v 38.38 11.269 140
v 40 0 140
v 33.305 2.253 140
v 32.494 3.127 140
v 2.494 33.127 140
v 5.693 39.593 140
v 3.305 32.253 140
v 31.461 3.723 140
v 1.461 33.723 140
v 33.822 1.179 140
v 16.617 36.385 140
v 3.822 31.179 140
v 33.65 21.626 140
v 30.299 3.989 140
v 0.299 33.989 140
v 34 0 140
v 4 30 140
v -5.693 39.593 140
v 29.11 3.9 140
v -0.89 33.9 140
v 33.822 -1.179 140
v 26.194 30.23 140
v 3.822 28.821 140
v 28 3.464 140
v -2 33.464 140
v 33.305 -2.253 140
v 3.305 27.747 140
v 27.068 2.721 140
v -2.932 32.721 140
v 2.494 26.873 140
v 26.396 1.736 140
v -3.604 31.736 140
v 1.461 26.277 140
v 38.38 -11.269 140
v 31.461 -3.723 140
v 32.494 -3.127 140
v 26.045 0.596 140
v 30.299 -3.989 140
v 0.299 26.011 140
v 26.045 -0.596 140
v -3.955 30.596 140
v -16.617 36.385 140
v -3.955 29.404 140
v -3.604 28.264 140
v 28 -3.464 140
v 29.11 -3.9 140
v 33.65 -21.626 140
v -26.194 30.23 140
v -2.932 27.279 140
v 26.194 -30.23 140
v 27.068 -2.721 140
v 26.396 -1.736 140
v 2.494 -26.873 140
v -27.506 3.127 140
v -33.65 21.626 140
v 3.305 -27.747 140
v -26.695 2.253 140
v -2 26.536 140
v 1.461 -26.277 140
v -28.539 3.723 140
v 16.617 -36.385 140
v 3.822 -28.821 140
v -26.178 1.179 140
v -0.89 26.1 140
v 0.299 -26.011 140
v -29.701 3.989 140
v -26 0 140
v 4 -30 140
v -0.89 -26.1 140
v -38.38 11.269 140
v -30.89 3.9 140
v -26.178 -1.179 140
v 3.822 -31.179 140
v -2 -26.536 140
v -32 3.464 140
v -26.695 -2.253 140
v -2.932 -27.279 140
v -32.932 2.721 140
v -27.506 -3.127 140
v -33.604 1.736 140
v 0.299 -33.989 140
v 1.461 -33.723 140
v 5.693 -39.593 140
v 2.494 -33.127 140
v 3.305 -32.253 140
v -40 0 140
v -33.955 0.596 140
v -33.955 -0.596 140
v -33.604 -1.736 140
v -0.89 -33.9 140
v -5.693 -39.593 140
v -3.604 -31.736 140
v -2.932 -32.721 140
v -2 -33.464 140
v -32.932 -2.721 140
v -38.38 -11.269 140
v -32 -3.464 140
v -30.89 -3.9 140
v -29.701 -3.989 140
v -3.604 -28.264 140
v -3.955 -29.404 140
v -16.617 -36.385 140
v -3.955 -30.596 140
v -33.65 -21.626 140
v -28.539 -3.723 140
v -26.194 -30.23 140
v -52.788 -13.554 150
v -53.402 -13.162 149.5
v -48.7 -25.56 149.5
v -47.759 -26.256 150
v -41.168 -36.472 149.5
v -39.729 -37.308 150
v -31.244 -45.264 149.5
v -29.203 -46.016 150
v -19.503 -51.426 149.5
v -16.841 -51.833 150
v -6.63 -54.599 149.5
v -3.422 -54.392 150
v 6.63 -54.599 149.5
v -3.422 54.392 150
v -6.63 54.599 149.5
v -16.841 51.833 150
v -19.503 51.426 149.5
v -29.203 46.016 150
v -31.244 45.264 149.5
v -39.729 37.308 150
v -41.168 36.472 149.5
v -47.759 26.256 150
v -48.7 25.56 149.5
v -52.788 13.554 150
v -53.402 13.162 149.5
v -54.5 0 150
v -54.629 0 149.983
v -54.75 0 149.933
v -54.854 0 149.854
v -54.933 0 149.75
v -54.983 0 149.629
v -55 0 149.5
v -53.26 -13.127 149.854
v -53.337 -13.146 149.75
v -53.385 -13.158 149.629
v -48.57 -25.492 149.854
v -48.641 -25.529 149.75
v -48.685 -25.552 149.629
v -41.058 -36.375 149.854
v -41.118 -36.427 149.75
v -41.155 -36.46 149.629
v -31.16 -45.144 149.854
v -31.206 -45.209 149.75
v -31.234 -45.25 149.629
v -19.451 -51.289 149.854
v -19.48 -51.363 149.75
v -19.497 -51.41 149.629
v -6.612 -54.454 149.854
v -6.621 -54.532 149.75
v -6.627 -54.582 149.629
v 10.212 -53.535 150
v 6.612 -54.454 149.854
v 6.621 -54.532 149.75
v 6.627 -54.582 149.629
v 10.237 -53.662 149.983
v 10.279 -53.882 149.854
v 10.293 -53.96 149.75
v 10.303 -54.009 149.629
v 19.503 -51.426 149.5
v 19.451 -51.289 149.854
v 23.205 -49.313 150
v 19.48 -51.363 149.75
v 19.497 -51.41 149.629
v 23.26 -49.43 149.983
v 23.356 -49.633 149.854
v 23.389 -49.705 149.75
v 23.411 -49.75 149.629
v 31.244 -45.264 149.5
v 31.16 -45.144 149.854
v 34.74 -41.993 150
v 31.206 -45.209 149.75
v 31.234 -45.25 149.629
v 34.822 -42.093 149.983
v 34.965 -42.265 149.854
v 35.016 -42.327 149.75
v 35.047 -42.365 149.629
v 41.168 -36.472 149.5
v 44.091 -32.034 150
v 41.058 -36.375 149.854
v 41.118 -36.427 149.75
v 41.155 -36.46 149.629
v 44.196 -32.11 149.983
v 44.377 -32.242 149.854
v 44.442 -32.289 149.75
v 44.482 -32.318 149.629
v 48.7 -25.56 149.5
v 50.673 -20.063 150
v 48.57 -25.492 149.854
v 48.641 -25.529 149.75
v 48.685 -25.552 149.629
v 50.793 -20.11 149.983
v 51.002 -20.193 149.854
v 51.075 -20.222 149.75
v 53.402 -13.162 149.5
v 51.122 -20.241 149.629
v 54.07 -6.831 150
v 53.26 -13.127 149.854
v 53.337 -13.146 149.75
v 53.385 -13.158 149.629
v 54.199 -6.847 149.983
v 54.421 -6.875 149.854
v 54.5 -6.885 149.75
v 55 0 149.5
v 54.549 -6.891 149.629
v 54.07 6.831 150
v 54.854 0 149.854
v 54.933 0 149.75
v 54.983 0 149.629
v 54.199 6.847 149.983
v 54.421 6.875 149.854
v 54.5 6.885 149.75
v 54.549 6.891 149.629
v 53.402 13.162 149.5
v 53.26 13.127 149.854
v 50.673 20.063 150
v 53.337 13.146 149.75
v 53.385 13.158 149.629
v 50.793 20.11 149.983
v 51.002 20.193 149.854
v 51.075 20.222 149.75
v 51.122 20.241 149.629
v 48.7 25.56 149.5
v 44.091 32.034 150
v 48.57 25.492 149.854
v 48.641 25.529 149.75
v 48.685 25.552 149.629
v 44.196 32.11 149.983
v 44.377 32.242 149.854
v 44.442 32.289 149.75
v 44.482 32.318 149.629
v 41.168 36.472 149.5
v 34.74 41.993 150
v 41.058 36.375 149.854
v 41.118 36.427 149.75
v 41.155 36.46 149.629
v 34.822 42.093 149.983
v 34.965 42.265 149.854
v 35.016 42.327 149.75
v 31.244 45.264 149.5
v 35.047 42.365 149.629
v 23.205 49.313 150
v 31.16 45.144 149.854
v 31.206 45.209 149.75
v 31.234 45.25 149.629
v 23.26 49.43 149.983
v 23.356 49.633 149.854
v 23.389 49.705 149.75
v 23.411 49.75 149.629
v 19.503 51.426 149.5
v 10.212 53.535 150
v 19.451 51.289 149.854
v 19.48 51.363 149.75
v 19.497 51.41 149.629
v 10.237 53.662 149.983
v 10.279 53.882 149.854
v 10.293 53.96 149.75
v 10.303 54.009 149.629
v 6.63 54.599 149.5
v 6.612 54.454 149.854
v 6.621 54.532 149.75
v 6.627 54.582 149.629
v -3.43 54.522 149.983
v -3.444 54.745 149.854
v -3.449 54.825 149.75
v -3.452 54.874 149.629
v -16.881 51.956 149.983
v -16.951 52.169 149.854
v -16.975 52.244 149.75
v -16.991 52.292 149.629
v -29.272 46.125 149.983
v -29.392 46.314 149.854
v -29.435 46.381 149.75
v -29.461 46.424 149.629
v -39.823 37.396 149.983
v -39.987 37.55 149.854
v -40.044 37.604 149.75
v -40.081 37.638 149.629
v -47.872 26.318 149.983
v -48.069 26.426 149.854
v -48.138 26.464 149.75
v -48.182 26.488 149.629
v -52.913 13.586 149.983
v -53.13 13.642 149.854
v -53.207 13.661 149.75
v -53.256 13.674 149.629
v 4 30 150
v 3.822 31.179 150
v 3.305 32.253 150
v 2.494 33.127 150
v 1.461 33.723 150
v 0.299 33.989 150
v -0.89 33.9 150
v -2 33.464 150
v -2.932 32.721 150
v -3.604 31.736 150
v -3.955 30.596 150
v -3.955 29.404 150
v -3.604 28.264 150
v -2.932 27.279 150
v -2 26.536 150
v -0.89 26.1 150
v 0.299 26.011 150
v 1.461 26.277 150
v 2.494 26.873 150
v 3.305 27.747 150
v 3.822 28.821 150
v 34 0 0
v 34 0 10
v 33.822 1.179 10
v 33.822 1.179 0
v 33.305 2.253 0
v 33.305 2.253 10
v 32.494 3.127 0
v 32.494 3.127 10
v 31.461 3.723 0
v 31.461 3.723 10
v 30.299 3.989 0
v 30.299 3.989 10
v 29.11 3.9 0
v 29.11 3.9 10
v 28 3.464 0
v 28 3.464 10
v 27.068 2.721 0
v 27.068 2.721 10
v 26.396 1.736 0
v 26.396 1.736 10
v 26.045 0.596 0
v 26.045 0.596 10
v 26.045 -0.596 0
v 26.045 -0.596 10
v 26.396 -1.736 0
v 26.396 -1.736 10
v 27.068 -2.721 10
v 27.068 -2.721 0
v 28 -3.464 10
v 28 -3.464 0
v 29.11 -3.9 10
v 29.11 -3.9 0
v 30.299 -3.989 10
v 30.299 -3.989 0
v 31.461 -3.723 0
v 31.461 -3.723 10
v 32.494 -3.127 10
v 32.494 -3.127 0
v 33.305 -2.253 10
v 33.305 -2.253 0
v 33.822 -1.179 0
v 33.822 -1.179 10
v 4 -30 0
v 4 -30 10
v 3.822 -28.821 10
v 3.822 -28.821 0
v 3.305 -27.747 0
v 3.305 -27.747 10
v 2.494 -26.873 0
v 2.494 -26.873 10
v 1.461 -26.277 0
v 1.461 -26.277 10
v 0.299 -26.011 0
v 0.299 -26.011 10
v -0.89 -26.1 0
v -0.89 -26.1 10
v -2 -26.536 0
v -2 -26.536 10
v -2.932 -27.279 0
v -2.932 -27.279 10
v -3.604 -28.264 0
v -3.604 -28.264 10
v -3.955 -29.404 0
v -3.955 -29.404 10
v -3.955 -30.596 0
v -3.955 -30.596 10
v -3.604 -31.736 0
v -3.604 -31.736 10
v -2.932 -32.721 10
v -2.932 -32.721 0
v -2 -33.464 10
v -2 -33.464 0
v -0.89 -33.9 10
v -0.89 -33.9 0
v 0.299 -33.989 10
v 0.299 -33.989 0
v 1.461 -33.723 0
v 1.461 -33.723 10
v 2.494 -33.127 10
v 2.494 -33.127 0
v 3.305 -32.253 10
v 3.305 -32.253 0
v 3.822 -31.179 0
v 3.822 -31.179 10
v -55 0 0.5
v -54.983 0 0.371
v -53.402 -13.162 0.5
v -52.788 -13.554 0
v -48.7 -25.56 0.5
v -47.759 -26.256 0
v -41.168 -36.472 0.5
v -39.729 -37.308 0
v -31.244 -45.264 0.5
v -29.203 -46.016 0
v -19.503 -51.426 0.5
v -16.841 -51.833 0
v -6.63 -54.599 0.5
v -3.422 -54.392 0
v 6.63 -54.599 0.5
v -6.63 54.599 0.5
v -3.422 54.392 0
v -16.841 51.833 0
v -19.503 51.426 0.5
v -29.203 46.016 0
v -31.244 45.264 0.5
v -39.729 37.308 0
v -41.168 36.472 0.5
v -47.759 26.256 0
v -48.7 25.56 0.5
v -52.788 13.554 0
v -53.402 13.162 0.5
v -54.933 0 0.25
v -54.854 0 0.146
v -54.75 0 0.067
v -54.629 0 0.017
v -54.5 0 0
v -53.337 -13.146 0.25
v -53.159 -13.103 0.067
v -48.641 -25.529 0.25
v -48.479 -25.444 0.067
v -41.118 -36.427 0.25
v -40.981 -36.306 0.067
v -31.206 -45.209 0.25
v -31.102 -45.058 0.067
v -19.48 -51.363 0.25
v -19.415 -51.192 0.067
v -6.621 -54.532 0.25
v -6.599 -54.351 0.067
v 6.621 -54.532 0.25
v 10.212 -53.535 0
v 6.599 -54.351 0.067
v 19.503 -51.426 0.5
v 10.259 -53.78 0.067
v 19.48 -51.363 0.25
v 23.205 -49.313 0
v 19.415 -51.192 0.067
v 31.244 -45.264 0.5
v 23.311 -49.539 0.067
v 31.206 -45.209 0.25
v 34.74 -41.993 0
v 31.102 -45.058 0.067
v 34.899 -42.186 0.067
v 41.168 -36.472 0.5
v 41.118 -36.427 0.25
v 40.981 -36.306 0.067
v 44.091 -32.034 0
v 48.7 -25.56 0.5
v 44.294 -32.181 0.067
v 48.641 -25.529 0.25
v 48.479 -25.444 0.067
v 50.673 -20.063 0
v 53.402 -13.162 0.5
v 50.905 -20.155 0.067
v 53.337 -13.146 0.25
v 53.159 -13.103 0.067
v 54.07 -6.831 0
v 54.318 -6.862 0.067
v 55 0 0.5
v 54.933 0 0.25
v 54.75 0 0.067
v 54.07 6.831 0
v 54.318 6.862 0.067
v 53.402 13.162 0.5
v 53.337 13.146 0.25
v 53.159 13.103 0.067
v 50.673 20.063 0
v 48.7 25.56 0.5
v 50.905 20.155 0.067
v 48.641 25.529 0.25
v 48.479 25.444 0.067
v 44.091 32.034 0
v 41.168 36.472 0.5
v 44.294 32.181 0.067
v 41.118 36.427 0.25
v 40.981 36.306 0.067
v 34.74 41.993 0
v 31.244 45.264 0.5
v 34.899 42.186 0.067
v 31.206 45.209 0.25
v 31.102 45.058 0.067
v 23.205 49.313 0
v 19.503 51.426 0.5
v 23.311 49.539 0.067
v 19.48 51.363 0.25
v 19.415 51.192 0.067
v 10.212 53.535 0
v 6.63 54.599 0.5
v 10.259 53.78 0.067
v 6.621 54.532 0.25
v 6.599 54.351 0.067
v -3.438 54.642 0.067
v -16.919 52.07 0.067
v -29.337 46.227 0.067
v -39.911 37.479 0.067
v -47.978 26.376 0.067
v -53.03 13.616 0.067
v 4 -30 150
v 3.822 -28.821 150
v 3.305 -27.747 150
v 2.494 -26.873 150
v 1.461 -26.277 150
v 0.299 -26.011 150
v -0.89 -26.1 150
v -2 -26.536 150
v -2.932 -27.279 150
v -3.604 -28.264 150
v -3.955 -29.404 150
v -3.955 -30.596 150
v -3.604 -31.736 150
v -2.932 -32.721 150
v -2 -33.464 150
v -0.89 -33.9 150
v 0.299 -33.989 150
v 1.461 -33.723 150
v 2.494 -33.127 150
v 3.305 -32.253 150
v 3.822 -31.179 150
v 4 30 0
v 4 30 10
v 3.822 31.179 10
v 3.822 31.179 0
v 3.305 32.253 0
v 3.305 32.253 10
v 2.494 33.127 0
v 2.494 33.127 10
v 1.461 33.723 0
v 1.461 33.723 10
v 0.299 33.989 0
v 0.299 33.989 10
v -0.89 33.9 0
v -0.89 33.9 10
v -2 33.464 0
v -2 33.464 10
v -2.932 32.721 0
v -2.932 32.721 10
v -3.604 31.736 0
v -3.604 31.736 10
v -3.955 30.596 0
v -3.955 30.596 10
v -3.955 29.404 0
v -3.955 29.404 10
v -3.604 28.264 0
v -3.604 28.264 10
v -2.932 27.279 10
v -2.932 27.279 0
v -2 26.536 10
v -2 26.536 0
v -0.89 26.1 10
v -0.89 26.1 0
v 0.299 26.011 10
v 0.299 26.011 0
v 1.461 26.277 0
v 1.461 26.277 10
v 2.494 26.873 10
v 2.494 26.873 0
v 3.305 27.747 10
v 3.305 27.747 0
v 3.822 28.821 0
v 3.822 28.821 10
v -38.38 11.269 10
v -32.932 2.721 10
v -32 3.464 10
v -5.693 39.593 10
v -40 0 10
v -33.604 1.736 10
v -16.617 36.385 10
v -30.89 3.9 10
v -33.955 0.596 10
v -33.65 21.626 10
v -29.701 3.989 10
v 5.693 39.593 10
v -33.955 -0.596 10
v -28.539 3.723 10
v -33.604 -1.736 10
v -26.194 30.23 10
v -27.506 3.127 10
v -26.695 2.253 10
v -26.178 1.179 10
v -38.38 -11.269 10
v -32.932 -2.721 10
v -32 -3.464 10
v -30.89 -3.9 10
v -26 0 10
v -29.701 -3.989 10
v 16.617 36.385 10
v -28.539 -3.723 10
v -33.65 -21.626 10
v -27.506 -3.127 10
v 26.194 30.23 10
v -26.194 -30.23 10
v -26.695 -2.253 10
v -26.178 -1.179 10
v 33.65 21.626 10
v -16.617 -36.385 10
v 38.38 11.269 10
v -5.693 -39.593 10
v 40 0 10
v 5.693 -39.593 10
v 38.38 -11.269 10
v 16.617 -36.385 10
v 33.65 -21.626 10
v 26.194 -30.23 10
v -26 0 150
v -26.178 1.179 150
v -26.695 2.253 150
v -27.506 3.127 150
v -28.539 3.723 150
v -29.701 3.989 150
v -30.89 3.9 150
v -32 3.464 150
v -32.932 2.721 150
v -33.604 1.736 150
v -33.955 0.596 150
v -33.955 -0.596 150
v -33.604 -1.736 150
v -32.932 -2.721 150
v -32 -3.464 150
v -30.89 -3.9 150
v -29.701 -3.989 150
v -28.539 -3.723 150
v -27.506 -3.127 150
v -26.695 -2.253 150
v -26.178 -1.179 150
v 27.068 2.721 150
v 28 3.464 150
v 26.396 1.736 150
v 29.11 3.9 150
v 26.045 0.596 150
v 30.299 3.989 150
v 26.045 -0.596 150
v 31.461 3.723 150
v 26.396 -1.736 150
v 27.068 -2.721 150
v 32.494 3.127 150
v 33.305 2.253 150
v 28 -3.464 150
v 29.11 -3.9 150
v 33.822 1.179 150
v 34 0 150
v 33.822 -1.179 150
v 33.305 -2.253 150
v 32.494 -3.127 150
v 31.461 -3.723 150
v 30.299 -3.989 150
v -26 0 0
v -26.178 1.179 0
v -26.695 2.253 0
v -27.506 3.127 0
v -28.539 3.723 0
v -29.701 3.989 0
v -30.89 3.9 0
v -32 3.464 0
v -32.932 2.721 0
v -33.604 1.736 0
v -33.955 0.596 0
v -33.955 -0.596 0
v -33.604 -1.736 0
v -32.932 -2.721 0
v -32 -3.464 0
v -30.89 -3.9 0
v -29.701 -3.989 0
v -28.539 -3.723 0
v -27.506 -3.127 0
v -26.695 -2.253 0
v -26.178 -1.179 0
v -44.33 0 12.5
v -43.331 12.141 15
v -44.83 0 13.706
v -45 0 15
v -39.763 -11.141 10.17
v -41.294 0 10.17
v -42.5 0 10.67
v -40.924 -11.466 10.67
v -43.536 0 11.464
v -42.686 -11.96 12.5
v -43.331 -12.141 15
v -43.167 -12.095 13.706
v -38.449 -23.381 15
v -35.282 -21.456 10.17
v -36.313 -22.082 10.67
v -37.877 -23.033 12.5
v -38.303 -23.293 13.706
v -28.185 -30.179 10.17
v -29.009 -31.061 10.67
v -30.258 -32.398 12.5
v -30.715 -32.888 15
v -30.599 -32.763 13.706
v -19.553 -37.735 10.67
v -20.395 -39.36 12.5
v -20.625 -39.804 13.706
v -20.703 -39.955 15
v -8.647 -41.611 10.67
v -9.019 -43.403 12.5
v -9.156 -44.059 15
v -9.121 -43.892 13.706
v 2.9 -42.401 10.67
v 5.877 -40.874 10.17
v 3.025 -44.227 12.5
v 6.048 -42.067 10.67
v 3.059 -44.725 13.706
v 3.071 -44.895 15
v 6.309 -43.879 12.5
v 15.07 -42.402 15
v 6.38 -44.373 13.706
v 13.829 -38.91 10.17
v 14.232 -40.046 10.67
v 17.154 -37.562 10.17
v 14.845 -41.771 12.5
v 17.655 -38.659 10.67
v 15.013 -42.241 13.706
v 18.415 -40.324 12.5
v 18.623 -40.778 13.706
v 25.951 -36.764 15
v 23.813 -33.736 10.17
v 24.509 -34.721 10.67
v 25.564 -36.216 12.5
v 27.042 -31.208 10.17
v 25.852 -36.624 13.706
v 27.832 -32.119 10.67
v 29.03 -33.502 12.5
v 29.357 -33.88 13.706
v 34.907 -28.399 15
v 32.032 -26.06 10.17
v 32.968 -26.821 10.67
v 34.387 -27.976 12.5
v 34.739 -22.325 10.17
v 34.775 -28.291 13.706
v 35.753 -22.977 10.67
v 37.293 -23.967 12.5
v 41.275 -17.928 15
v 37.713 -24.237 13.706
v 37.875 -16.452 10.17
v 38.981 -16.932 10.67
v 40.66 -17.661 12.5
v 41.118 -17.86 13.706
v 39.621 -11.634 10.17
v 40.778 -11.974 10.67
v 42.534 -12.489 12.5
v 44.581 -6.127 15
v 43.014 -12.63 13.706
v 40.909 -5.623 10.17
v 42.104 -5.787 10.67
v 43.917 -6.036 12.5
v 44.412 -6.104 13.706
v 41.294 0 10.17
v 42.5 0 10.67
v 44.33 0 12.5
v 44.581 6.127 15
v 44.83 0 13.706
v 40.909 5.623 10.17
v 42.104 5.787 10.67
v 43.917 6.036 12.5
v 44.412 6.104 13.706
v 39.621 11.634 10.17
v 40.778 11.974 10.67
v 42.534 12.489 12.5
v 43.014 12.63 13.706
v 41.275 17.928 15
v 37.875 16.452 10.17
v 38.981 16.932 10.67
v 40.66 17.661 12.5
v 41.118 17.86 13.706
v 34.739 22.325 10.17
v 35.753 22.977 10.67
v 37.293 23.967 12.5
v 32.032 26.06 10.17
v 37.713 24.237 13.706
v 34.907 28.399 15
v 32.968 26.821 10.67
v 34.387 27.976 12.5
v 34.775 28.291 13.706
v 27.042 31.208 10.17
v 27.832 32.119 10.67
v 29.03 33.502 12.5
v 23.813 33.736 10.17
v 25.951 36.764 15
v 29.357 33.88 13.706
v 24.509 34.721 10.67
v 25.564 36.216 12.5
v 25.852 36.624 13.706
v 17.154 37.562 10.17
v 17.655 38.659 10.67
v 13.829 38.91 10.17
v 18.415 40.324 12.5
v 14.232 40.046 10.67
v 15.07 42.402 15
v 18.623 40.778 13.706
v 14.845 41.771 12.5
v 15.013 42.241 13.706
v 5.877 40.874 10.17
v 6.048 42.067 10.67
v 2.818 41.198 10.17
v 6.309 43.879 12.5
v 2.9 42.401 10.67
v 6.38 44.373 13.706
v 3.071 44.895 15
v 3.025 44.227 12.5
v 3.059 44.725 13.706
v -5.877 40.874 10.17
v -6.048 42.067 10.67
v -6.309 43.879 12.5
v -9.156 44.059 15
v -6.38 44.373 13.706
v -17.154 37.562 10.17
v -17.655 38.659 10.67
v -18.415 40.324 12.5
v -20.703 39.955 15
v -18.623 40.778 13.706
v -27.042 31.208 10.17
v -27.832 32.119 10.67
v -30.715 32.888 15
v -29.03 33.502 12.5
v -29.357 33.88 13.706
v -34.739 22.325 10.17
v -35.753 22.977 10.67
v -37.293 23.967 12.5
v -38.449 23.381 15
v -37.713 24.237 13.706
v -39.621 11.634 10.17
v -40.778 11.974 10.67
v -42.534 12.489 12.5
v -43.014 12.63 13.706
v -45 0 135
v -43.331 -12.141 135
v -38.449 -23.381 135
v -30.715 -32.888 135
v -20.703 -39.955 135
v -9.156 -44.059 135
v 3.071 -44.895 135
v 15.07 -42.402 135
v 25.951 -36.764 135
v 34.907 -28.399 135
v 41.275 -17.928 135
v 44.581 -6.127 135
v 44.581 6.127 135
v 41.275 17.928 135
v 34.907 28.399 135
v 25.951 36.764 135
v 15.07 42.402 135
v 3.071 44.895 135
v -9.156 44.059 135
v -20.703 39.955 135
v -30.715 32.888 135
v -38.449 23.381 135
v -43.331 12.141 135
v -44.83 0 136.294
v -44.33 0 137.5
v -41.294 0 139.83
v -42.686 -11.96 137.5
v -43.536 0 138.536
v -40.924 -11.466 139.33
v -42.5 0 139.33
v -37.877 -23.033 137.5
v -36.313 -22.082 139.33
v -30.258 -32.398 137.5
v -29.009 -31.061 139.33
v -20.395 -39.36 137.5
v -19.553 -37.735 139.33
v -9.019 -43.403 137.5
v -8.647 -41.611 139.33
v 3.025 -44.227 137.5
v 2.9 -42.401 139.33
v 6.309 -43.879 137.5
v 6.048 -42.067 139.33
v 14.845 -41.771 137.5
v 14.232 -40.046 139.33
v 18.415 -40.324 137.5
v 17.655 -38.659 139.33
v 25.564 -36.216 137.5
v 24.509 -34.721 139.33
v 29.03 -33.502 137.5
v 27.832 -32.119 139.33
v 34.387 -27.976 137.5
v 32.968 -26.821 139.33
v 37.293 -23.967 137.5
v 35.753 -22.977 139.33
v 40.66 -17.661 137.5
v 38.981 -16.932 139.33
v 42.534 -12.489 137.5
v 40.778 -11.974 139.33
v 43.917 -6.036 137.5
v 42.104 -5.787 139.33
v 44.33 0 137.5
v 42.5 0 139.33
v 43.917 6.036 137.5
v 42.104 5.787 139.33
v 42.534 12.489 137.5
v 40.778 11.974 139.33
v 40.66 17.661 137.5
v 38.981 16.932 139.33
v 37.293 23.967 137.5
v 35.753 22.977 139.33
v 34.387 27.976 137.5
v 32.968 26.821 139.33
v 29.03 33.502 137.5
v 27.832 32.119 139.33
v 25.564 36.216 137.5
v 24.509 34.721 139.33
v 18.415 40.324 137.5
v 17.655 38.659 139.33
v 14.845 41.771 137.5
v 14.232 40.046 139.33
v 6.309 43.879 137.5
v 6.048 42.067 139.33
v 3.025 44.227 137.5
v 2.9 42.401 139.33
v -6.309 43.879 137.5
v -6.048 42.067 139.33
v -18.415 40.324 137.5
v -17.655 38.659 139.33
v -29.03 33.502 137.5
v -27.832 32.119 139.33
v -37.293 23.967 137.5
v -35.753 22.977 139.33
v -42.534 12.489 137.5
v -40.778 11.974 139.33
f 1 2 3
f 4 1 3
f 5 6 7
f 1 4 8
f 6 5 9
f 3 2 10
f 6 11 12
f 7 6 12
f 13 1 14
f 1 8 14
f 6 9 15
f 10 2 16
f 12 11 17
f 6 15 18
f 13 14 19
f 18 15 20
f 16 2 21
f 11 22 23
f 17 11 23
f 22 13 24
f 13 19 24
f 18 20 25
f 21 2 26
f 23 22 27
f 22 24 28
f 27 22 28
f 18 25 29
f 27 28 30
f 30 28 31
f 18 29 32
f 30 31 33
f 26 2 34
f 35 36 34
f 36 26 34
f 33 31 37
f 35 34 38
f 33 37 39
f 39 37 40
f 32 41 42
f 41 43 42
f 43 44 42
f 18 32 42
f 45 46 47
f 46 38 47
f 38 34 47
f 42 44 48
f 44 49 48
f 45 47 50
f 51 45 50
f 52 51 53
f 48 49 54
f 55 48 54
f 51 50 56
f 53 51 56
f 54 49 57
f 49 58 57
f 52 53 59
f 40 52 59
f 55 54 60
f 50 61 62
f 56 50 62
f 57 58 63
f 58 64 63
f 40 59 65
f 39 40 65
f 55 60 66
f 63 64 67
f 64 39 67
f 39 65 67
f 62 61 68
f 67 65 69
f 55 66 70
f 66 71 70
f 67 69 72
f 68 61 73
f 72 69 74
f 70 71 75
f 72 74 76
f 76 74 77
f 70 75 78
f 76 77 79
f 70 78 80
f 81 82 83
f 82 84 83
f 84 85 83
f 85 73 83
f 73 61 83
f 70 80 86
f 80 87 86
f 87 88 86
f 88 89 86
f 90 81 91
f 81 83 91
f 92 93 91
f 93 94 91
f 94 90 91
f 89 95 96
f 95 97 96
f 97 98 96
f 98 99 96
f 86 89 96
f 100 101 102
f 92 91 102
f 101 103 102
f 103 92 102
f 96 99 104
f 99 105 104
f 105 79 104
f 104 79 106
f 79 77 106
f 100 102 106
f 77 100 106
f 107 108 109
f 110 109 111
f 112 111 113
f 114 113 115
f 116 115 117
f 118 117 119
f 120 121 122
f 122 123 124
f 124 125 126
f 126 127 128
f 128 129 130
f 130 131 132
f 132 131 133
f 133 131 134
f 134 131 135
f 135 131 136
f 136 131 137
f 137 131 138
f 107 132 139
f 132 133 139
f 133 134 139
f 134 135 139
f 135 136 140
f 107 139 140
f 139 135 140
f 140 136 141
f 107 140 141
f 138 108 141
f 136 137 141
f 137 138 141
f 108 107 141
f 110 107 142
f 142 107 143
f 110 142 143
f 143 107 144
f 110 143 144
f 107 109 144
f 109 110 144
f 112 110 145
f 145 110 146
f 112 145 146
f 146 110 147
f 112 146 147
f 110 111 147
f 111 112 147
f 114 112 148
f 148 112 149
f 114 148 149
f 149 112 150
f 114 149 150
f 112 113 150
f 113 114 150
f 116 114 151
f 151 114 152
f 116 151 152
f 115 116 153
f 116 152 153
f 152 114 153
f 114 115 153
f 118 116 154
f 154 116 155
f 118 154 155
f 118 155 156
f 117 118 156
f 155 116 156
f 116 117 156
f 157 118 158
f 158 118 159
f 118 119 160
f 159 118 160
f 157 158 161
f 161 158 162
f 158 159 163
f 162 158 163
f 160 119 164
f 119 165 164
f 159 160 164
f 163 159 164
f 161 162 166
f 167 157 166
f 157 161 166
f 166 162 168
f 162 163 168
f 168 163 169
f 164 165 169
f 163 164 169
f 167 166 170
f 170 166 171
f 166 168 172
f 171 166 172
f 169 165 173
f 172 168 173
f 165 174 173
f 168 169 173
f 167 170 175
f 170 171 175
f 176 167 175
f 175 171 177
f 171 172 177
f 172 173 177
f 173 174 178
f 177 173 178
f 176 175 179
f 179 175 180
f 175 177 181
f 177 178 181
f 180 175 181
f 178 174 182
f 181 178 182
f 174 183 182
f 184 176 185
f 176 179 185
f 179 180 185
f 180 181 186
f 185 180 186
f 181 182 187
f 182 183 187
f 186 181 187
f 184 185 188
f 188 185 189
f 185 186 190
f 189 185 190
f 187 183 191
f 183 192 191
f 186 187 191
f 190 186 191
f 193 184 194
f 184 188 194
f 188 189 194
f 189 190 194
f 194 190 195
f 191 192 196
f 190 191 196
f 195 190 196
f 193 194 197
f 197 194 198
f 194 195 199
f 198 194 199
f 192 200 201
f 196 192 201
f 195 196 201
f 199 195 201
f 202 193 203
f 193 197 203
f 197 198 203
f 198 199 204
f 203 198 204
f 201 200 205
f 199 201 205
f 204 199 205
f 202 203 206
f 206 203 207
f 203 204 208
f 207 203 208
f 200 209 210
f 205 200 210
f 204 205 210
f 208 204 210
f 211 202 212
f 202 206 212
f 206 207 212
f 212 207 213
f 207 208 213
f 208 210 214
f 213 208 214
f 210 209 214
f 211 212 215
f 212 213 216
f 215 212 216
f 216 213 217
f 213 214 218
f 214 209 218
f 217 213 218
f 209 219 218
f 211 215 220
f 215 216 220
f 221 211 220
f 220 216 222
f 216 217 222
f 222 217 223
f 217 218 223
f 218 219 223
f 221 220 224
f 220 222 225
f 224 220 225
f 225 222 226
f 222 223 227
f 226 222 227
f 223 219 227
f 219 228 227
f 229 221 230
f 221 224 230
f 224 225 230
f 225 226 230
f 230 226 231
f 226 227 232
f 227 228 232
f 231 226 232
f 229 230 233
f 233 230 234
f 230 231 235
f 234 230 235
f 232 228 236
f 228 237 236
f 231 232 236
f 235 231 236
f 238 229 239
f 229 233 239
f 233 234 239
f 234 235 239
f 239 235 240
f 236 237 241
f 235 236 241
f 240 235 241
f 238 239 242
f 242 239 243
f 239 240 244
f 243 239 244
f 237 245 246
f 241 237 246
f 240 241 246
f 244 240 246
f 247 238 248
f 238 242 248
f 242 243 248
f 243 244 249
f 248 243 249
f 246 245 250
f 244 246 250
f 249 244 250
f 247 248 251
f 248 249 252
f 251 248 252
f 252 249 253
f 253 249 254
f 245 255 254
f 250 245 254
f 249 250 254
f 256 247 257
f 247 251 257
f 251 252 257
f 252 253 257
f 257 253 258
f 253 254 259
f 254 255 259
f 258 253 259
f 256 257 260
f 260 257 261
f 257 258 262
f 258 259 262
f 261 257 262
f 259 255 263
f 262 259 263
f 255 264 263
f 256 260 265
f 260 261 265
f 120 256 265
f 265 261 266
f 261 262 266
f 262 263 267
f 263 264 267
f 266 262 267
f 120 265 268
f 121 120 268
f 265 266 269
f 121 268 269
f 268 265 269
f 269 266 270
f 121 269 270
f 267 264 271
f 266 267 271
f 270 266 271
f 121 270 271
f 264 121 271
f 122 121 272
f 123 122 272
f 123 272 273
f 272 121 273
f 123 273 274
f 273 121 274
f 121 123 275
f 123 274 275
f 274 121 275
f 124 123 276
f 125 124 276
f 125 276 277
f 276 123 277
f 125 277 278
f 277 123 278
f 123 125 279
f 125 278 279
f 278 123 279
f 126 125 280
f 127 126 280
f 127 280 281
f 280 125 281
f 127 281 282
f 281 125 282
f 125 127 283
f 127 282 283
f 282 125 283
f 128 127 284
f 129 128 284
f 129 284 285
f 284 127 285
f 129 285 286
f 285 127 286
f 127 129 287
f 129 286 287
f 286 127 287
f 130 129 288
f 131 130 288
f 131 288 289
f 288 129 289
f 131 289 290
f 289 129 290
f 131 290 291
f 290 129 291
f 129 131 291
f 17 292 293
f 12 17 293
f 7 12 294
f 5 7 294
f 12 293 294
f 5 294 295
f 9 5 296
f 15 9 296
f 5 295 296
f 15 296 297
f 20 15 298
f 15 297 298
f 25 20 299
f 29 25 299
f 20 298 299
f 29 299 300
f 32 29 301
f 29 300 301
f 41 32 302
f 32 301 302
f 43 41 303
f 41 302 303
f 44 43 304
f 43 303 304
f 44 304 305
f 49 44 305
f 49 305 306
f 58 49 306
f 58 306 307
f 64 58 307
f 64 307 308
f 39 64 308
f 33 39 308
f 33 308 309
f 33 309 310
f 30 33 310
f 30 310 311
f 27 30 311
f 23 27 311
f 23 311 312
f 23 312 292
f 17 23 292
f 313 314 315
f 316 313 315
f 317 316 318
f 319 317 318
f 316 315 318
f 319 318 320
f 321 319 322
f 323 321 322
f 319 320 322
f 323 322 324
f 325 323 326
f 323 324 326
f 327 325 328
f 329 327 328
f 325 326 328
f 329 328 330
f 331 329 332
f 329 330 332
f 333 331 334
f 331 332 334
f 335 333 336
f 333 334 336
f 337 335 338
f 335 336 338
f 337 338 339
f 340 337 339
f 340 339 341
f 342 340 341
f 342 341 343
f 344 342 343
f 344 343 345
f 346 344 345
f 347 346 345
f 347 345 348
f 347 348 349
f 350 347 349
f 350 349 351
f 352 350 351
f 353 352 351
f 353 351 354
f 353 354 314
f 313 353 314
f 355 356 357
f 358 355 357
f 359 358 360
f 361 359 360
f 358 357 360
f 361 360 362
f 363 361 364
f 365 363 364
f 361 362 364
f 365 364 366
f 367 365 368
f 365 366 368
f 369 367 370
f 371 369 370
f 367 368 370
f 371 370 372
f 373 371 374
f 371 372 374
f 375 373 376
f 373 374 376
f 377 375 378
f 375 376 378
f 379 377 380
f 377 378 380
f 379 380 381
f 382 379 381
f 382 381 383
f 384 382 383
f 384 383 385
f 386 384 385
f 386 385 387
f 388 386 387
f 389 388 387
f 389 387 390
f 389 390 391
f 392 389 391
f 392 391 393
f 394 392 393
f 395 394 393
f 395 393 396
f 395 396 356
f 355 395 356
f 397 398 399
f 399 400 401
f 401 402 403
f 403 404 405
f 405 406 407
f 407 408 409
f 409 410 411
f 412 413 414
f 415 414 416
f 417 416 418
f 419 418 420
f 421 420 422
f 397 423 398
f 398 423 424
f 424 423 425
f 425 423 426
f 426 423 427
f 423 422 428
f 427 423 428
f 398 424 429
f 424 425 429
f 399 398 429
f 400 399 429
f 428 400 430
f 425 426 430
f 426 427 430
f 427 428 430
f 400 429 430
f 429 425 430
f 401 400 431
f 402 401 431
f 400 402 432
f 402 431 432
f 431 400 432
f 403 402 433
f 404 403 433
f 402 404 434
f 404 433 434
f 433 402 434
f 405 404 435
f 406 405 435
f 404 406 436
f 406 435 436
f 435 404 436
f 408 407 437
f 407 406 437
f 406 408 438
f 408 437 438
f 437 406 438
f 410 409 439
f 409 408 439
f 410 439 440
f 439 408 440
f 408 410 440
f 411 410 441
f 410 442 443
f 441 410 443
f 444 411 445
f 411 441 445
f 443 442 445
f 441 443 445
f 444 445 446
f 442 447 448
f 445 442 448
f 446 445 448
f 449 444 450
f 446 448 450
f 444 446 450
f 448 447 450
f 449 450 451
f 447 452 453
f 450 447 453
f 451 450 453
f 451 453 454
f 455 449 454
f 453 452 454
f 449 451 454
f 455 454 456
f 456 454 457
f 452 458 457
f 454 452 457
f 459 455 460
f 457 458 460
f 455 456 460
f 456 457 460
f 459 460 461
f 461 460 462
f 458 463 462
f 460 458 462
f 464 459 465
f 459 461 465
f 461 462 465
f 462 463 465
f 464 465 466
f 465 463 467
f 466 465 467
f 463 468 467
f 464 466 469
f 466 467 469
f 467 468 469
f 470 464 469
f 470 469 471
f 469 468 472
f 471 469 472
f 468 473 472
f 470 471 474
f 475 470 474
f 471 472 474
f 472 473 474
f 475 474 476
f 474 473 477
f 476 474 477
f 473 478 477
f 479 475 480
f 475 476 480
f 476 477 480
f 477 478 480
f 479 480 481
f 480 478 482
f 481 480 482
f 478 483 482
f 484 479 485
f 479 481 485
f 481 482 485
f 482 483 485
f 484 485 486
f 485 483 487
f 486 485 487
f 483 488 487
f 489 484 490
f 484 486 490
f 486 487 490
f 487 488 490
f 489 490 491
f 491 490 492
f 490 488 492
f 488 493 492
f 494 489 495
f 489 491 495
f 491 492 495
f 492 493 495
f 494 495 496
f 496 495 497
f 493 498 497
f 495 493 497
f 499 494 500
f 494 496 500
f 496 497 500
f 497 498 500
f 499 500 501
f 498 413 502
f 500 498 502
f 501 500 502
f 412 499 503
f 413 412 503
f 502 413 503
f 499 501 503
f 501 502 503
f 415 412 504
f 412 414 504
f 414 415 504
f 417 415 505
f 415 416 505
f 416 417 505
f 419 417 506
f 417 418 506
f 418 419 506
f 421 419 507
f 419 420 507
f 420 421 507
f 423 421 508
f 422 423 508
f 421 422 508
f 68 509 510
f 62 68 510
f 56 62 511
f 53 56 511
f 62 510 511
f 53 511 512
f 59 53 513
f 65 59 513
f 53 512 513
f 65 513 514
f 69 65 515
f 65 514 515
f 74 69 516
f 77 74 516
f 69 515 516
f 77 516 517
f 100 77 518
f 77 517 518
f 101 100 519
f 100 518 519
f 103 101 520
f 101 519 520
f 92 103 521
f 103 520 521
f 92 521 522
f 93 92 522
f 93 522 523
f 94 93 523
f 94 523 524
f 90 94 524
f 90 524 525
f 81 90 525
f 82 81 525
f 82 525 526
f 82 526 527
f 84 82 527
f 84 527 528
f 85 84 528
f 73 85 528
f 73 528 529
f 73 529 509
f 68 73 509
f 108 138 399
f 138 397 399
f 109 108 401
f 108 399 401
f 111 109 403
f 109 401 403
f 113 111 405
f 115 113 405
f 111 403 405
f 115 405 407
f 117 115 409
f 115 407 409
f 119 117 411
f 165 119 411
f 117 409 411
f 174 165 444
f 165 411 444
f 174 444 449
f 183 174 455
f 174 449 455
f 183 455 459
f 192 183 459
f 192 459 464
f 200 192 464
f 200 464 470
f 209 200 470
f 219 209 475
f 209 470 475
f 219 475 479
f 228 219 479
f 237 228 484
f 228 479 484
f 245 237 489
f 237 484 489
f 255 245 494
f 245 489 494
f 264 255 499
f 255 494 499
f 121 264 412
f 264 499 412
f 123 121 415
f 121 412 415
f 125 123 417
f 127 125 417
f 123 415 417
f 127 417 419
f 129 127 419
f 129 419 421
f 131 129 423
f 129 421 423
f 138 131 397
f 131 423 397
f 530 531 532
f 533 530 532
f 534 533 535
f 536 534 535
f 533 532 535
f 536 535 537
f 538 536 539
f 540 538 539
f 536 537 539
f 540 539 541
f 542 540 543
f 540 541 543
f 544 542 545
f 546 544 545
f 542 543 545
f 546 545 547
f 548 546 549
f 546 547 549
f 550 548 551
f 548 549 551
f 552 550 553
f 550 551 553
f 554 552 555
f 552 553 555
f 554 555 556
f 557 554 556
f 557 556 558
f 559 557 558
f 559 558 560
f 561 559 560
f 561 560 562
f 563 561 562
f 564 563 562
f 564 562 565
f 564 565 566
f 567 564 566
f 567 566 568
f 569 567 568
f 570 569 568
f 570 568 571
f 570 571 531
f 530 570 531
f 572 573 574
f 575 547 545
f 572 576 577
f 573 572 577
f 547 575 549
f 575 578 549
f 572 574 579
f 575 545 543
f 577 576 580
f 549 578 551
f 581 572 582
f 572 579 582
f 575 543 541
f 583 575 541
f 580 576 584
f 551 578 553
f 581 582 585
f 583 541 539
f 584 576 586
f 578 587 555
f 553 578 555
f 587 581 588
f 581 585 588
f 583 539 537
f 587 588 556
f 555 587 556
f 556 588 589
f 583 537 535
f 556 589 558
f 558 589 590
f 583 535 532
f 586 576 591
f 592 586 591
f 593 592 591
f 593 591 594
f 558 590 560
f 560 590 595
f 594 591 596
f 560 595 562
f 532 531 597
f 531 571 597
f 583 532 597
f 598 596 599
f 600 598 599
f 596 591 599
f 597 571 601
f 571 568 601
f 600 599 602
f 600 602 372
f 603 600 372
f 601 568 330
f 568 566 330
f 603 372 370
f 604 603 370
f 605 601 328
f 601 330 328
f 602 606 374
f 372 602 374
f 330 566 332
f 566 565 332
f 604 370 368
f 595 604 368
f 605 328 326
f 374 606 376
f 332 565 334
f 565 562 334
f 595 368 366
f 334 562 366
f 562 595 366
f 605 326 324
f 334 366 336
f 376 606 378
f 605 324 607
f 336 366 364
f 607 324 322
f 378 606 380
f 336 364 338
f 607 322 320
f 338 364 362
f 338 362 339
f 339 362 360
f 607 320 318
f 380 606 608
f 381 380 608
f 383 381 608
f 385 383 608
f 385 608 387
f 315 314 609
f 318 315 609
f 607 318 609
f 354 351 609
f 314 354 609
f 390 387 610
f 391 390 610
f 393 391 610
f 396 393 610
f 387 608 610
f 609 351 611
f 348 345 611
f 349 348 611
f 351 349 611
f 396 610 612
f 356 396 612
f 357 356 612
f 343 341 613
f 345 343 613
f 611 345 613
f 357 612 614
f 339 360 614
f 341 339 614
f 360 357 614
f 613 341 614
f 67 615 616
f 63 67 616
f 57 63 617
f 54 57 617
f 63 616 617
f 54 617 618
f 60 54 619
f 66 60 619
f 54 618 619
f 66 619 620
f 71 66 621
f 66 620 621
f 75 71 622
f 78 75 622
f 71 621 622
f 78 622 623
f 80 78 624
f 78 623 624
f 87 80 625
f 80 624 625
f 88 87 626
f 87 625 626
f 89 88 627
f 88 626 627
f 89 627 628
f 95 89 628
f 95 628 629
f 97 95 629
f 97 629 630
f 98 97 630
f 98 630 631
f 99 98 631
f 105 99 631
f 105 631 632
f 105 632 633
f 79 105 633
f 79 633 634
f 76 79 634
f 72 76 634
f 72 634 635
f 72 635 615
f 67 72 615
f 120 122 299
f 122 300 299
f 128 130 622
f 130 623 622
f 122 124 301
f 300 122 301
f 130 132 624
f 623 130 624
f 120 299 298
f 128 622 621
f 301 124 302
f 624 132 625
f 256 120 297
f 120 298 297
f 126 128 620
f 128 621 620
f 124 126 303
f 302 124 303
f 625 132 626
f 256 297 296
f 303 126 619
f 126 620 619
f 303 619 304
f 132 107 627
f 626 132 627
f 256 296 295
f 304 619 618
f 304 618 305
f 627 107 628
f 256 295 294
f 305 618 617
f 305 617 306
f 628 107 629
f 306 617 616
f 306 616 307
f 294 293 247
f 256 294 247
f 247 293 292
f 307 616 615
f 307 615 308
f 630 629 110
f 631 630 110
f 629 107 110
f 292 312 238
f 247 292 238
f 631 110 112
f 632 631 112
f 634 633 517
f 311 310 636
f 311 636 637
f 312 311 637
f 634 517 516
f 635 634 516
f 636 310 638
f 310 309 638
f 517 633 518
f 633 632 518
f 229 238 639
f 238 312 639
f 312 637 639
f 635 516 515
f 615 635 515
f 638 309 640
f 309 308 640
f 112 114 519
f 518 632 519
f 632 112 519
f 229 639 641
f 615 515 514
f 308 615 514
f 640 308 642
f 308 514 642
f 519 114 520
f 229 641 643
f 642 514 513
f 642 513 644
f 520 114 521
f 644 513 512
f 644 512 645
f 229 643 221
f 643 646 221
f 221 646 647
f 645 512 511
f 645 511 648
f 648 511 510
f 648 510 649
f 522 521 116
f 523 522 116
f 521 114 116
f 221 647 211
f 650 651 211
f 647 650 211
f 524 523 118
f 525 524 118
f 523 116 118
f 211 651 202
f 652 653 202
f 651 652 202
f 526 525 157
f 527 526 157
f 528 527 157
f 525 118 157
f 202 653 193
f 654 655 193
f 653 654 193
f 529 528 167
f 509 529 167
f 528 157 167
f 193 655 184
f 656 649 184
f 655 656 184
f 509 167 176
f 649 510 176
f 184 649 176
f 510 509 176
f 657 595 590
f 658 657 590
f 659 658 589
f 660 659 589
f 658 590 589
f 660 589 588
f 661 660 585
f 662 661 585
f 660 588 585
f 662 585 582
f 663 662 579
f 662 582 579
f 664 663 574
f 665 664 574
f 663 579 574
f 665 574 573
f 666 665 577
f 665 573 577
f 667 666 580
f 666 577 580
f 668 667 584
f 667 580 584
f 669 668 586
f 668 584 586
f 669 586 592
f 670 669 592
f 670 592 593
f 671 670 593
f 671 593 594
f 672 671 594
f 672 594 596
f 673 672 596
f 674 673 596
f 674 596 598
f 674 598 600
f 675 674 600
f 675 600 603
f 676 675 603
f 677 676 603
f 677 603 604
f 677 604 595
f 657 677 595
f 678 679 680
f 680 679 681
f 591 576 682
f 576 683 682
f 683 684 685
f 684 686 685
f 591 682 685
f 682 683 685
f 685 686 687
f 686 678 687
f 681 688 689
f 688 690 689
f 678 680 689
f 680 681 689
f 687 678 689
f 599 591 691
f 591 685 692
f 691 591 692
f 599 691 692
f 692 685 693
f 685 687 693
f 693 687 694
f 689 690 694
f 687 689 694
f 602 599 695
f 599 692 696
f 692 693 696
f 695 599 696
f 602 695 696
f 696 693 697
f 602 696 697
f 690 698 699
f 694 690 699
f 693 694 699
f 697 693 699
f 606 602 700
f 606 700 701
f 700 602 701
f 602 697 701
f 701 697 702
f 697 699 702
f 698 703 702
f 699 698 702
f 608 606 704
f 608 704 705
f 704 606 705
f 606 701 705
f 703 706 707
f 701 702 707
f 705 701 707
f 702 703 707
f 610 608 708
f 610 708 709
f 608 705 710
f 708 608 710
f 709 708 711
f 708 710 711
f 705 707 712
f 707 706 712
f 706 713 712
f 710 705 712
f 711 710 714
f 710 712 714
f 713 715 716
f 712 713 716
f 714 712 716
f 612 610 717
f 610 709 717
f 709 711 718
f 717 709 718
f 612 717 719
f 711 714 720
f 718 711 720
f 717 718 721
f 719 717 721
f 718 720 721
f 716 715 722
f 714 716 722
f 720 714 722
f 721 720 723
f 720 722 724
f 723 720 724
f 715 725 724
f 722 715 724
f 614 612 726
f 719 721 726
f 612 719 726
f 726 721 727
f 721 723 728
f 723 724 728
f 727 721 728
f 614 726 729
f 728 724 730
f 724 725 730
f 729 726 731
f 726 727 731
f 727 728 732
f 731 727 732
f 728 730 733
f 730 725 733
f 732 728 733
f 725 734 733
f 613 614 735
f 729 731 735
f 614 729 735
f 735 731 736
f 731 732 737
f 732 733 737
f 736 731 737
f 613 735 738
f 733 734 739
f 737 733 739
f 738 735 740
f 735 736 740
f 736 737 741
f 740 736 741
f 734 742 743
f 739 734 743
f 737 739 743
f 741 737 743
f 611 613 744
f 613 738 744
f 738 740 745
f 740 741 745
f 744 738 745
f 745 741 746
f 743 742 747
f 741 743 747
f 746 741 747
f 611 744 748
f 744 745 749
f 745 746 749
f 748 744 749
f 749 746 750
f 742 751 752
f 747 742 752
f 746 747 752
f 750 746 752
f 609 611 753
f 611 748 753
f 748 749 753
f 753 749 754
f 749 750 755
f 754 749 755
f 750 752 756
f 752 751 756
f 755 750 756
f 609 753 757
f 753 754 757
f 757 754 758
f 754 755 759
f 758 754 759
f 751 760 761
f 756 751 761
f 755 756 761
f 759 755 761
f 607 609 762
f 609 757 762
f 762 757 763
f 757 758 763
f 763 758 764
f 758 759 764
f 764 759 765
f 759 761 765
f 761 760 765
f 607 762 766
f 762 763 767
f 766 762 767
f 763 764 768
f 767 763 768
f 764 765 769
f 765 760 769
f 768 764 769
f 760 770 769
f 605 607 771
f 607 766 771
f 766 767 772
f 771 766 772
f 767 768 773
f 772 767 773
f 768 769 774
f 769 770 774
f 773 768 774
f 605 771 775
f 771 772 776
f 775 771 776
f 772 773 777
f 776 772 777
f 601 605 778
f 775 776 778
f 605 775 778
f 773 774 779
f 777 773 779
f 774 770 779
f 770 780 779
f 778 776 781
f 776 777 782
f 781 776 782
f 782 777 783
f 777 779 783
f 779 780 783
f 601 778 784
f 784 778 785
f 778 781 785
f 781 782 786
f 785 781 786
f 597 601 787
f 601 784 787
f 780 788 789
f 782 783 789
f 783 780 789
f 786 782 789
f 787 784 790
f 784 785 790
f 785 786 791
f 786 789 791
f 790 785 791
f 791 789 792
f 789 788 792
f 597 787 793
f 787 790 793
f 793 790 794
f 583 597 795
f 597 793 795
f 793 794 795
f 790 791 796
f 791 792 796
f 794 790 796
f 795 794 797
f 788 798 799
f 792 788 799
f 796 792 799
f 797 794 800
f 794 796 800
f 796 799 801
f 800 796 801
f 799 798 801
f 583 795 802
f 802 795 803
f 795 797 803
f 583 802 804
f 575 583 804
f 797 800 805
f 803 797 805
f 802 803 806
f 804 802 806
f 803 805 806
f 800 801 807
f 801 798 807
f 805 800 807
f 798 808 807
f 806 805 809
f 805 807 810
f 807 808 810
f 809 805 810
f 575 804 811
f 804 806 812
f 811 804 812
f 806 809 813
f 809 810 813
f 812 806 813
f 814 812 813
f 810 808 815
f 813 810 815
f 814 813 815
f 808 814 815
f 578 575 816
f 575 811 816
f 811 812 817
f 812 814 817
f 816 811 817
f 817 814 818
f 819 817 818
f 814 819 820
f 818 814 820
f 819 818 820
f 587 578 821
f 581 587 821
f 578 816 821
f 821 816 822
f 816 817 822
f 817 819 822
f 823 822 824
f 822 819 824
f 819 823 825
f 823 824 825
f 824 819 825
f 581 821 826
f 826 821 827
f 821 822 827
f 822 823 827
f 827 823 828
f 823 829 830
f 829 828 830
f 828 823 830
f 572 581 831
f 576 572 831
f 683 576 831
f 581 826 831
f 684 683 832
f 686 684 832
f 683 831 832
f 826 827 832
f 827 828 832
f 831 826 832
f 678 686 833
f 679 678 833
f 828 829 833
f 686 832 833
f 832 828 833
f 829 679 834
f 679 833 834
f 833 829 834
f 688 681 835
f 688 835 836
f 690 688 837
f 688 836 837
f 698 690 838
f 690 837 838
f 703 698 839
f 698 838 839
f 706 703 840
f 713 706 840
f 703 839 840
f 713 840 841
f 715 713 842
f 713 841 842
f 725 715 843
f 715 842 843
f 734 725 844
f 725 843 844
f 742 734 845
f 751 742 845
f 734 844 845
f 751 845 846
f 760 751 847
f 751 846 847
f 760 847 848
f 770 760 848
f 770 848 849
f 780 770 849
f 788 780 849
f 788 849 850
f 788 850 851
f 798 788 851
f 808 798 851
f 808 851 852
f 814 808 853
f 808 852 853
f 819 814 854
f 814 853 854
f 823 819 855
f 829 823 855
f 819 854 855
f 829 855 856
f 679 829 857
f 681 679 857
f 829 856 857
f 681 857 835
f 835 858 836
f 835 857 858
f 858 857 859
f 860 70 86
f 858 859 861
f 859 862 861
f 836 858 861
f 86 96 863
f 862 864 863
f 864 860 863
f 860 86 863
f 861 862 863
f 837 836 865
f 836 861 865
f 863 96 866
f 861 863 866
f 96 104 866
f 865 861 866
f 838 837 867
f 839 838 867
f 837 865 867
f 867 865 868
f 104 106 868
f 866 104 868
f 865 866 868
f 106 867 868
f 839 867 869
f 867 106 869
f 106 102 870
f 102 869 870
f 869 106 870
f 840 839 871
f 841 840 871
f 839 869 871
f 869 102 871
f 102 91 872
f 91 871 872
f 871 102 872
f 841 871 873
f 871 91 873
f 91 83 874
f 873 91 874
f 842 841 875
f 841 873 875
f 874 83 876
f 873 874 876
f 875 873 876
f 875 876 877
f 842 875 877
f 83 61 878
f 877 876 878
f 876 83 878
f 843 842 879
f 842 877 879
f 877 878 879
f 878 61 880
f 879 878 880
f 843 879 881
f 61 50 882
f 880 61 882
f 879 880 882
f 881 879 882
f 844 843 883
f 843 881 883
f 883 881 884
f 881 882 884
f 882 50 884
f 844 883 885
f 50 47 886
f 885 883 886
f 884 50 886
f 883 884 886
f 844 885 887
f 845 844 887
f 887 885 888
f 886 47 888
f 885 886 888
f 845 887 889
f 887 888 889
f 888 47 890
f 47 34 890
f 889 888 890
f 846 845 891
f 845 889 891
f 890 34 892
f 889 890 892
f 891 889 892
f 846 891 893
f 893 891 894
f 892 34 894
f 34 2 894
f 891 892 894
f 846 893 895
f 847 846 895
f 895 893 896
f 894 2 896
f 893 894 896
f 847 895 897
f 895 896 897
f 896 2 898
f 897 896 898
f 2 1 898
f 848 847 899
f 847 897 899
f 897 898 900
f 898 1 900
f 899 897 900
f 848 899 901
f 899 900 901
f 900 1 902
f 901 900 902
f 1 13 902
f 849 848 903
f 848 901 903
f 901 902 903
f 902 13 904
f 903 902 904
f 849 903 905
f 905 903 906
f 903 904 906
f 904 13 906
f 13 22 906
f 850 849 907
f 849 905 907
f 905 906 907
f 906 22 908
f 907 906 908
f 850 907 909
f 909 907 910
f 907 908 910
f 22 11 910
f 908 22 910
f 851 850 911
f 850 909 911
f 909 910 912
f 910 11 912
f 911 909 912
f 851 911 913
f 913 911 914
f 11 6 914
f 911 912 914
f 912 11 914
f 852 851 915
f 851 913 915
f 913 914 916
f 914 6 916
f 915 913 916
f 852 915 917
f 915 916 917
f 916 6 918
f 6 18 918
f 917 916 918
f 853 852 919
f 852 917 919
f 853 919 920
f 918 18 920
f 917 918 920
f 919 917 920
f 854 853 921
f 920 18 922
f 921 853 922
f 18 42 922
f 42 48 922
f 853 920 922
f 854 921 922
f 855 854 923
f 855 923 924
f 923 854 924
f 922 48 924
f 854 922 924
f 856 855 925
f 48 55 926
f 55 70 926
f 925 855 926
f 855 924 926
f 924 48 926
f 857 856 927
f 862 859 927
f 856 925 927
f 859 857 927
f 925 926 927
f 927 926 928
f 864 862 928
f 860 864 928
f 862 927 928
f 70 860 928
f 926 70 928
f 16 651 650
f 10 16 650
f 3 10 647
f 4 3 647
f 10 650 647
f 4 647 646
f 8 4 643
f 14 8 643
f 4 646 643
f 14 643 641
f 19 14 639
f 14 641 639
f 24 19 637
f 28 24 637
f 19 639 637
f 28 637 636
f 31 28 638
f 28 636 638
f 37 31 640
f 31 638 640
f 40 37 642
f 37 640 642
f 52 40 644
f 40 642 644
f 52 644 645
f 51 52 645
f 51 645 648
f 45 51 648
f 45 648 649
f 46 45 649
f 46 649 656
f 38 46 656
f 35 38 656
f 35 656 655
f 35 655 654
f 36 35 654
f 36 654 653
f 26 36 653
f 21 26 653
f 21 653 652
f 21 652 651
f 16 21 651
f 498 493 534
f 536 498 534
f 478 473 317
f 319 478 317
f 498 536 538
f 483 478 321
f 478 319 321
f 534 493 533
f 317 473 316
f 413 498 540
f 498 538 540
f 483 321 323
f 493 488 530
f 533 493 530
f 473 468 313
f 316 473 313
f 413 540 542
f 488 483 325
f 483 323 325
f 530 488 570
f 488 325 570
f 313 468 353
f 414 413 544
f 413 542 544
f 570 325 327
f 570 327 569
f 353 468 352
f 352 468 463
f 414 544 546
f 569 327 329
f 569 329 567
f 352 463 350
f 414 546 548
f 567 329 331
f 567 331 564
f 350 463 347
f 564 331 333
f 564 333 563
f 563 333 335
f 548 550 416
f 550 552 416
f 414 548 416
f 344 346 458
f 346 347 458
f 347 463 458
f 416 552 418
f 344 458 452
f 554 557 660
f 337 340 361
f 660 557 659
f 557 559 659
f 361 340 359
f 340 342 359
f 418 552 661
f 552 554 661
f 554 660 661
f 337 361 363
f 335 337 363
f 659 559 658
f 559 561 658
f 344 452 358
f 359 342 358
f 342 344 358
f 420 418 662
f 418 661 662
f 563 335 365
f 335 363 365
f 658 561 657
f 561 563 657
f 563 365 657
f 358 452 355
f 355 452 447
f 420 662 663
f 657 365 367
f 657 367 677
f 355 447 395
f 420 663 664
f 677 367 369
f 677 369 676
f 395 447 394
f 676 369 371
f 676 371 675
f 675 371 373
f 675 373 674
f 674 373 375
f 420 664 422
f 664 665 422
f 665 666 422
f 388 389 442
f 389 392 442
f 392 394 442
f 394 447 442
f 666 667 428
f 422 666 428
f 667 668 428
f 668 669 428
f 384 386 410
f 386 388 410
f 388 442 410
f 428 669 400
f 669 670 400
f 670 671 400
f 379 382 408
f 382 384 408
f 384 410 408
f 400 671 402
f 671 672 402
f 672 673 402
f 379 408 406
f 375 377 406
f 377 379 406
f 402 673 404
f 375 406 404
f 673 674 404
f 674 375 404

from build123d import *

# Parameters (mm, degrees)
F2_R     = 4
F3_DEPTH = 150.001


with BuildPart() as f1:
    # F0 (on Front) → F1 (revolve)
    with BuildSketch(Plane.XZ):
        with BuildLine():
            Line((-54.5, 0), (0, 0))
            Line((0, 0), (0, 10))
            Line((0, 10), (-40, 10))
            ThreePointArc((-40, 10), (-43.535534, 11.464466), (-45, 15))
            Line((-45, 15), (-45, 135))
            ThreePointArc((-45, 135), (-43.535534, 138.535534), (-40, 140))
            Line((-40, 140), (0, 140))
            Line((0, 140), (0, 150))
            Line((0, 150), (-54.5, 150))
            ThreePointArc((-54.5, 150), (-54.853553, 149.853553), (-55, 149.5))
            Line((-55, 149.5), (-55, 0.5))
            ThreePointArc((-55, 0.5), (-54.853553, 0.146447), (-54.5, 0))
        make_face()
    revolve(axis=Axis((0, 0, 48.276713), (0, 0, 1)))

    # F2 (on face) → F3 (cut, through all)
    with BuildSketch(Plane.XY.offset(150)):
        with Locations((30, 0)):
            Circle(F2_R)
        with Locations((0, 30)):
            Circle(F2_R)
        with Locations((-30, 0)):
            Circle(F2_R)
        with Locations((0, -30)):
            Circle(F2_R)
    extrude(amount=-F3_DEPTH, mode=Mode.SUBTRACT)


solid = f1.part
